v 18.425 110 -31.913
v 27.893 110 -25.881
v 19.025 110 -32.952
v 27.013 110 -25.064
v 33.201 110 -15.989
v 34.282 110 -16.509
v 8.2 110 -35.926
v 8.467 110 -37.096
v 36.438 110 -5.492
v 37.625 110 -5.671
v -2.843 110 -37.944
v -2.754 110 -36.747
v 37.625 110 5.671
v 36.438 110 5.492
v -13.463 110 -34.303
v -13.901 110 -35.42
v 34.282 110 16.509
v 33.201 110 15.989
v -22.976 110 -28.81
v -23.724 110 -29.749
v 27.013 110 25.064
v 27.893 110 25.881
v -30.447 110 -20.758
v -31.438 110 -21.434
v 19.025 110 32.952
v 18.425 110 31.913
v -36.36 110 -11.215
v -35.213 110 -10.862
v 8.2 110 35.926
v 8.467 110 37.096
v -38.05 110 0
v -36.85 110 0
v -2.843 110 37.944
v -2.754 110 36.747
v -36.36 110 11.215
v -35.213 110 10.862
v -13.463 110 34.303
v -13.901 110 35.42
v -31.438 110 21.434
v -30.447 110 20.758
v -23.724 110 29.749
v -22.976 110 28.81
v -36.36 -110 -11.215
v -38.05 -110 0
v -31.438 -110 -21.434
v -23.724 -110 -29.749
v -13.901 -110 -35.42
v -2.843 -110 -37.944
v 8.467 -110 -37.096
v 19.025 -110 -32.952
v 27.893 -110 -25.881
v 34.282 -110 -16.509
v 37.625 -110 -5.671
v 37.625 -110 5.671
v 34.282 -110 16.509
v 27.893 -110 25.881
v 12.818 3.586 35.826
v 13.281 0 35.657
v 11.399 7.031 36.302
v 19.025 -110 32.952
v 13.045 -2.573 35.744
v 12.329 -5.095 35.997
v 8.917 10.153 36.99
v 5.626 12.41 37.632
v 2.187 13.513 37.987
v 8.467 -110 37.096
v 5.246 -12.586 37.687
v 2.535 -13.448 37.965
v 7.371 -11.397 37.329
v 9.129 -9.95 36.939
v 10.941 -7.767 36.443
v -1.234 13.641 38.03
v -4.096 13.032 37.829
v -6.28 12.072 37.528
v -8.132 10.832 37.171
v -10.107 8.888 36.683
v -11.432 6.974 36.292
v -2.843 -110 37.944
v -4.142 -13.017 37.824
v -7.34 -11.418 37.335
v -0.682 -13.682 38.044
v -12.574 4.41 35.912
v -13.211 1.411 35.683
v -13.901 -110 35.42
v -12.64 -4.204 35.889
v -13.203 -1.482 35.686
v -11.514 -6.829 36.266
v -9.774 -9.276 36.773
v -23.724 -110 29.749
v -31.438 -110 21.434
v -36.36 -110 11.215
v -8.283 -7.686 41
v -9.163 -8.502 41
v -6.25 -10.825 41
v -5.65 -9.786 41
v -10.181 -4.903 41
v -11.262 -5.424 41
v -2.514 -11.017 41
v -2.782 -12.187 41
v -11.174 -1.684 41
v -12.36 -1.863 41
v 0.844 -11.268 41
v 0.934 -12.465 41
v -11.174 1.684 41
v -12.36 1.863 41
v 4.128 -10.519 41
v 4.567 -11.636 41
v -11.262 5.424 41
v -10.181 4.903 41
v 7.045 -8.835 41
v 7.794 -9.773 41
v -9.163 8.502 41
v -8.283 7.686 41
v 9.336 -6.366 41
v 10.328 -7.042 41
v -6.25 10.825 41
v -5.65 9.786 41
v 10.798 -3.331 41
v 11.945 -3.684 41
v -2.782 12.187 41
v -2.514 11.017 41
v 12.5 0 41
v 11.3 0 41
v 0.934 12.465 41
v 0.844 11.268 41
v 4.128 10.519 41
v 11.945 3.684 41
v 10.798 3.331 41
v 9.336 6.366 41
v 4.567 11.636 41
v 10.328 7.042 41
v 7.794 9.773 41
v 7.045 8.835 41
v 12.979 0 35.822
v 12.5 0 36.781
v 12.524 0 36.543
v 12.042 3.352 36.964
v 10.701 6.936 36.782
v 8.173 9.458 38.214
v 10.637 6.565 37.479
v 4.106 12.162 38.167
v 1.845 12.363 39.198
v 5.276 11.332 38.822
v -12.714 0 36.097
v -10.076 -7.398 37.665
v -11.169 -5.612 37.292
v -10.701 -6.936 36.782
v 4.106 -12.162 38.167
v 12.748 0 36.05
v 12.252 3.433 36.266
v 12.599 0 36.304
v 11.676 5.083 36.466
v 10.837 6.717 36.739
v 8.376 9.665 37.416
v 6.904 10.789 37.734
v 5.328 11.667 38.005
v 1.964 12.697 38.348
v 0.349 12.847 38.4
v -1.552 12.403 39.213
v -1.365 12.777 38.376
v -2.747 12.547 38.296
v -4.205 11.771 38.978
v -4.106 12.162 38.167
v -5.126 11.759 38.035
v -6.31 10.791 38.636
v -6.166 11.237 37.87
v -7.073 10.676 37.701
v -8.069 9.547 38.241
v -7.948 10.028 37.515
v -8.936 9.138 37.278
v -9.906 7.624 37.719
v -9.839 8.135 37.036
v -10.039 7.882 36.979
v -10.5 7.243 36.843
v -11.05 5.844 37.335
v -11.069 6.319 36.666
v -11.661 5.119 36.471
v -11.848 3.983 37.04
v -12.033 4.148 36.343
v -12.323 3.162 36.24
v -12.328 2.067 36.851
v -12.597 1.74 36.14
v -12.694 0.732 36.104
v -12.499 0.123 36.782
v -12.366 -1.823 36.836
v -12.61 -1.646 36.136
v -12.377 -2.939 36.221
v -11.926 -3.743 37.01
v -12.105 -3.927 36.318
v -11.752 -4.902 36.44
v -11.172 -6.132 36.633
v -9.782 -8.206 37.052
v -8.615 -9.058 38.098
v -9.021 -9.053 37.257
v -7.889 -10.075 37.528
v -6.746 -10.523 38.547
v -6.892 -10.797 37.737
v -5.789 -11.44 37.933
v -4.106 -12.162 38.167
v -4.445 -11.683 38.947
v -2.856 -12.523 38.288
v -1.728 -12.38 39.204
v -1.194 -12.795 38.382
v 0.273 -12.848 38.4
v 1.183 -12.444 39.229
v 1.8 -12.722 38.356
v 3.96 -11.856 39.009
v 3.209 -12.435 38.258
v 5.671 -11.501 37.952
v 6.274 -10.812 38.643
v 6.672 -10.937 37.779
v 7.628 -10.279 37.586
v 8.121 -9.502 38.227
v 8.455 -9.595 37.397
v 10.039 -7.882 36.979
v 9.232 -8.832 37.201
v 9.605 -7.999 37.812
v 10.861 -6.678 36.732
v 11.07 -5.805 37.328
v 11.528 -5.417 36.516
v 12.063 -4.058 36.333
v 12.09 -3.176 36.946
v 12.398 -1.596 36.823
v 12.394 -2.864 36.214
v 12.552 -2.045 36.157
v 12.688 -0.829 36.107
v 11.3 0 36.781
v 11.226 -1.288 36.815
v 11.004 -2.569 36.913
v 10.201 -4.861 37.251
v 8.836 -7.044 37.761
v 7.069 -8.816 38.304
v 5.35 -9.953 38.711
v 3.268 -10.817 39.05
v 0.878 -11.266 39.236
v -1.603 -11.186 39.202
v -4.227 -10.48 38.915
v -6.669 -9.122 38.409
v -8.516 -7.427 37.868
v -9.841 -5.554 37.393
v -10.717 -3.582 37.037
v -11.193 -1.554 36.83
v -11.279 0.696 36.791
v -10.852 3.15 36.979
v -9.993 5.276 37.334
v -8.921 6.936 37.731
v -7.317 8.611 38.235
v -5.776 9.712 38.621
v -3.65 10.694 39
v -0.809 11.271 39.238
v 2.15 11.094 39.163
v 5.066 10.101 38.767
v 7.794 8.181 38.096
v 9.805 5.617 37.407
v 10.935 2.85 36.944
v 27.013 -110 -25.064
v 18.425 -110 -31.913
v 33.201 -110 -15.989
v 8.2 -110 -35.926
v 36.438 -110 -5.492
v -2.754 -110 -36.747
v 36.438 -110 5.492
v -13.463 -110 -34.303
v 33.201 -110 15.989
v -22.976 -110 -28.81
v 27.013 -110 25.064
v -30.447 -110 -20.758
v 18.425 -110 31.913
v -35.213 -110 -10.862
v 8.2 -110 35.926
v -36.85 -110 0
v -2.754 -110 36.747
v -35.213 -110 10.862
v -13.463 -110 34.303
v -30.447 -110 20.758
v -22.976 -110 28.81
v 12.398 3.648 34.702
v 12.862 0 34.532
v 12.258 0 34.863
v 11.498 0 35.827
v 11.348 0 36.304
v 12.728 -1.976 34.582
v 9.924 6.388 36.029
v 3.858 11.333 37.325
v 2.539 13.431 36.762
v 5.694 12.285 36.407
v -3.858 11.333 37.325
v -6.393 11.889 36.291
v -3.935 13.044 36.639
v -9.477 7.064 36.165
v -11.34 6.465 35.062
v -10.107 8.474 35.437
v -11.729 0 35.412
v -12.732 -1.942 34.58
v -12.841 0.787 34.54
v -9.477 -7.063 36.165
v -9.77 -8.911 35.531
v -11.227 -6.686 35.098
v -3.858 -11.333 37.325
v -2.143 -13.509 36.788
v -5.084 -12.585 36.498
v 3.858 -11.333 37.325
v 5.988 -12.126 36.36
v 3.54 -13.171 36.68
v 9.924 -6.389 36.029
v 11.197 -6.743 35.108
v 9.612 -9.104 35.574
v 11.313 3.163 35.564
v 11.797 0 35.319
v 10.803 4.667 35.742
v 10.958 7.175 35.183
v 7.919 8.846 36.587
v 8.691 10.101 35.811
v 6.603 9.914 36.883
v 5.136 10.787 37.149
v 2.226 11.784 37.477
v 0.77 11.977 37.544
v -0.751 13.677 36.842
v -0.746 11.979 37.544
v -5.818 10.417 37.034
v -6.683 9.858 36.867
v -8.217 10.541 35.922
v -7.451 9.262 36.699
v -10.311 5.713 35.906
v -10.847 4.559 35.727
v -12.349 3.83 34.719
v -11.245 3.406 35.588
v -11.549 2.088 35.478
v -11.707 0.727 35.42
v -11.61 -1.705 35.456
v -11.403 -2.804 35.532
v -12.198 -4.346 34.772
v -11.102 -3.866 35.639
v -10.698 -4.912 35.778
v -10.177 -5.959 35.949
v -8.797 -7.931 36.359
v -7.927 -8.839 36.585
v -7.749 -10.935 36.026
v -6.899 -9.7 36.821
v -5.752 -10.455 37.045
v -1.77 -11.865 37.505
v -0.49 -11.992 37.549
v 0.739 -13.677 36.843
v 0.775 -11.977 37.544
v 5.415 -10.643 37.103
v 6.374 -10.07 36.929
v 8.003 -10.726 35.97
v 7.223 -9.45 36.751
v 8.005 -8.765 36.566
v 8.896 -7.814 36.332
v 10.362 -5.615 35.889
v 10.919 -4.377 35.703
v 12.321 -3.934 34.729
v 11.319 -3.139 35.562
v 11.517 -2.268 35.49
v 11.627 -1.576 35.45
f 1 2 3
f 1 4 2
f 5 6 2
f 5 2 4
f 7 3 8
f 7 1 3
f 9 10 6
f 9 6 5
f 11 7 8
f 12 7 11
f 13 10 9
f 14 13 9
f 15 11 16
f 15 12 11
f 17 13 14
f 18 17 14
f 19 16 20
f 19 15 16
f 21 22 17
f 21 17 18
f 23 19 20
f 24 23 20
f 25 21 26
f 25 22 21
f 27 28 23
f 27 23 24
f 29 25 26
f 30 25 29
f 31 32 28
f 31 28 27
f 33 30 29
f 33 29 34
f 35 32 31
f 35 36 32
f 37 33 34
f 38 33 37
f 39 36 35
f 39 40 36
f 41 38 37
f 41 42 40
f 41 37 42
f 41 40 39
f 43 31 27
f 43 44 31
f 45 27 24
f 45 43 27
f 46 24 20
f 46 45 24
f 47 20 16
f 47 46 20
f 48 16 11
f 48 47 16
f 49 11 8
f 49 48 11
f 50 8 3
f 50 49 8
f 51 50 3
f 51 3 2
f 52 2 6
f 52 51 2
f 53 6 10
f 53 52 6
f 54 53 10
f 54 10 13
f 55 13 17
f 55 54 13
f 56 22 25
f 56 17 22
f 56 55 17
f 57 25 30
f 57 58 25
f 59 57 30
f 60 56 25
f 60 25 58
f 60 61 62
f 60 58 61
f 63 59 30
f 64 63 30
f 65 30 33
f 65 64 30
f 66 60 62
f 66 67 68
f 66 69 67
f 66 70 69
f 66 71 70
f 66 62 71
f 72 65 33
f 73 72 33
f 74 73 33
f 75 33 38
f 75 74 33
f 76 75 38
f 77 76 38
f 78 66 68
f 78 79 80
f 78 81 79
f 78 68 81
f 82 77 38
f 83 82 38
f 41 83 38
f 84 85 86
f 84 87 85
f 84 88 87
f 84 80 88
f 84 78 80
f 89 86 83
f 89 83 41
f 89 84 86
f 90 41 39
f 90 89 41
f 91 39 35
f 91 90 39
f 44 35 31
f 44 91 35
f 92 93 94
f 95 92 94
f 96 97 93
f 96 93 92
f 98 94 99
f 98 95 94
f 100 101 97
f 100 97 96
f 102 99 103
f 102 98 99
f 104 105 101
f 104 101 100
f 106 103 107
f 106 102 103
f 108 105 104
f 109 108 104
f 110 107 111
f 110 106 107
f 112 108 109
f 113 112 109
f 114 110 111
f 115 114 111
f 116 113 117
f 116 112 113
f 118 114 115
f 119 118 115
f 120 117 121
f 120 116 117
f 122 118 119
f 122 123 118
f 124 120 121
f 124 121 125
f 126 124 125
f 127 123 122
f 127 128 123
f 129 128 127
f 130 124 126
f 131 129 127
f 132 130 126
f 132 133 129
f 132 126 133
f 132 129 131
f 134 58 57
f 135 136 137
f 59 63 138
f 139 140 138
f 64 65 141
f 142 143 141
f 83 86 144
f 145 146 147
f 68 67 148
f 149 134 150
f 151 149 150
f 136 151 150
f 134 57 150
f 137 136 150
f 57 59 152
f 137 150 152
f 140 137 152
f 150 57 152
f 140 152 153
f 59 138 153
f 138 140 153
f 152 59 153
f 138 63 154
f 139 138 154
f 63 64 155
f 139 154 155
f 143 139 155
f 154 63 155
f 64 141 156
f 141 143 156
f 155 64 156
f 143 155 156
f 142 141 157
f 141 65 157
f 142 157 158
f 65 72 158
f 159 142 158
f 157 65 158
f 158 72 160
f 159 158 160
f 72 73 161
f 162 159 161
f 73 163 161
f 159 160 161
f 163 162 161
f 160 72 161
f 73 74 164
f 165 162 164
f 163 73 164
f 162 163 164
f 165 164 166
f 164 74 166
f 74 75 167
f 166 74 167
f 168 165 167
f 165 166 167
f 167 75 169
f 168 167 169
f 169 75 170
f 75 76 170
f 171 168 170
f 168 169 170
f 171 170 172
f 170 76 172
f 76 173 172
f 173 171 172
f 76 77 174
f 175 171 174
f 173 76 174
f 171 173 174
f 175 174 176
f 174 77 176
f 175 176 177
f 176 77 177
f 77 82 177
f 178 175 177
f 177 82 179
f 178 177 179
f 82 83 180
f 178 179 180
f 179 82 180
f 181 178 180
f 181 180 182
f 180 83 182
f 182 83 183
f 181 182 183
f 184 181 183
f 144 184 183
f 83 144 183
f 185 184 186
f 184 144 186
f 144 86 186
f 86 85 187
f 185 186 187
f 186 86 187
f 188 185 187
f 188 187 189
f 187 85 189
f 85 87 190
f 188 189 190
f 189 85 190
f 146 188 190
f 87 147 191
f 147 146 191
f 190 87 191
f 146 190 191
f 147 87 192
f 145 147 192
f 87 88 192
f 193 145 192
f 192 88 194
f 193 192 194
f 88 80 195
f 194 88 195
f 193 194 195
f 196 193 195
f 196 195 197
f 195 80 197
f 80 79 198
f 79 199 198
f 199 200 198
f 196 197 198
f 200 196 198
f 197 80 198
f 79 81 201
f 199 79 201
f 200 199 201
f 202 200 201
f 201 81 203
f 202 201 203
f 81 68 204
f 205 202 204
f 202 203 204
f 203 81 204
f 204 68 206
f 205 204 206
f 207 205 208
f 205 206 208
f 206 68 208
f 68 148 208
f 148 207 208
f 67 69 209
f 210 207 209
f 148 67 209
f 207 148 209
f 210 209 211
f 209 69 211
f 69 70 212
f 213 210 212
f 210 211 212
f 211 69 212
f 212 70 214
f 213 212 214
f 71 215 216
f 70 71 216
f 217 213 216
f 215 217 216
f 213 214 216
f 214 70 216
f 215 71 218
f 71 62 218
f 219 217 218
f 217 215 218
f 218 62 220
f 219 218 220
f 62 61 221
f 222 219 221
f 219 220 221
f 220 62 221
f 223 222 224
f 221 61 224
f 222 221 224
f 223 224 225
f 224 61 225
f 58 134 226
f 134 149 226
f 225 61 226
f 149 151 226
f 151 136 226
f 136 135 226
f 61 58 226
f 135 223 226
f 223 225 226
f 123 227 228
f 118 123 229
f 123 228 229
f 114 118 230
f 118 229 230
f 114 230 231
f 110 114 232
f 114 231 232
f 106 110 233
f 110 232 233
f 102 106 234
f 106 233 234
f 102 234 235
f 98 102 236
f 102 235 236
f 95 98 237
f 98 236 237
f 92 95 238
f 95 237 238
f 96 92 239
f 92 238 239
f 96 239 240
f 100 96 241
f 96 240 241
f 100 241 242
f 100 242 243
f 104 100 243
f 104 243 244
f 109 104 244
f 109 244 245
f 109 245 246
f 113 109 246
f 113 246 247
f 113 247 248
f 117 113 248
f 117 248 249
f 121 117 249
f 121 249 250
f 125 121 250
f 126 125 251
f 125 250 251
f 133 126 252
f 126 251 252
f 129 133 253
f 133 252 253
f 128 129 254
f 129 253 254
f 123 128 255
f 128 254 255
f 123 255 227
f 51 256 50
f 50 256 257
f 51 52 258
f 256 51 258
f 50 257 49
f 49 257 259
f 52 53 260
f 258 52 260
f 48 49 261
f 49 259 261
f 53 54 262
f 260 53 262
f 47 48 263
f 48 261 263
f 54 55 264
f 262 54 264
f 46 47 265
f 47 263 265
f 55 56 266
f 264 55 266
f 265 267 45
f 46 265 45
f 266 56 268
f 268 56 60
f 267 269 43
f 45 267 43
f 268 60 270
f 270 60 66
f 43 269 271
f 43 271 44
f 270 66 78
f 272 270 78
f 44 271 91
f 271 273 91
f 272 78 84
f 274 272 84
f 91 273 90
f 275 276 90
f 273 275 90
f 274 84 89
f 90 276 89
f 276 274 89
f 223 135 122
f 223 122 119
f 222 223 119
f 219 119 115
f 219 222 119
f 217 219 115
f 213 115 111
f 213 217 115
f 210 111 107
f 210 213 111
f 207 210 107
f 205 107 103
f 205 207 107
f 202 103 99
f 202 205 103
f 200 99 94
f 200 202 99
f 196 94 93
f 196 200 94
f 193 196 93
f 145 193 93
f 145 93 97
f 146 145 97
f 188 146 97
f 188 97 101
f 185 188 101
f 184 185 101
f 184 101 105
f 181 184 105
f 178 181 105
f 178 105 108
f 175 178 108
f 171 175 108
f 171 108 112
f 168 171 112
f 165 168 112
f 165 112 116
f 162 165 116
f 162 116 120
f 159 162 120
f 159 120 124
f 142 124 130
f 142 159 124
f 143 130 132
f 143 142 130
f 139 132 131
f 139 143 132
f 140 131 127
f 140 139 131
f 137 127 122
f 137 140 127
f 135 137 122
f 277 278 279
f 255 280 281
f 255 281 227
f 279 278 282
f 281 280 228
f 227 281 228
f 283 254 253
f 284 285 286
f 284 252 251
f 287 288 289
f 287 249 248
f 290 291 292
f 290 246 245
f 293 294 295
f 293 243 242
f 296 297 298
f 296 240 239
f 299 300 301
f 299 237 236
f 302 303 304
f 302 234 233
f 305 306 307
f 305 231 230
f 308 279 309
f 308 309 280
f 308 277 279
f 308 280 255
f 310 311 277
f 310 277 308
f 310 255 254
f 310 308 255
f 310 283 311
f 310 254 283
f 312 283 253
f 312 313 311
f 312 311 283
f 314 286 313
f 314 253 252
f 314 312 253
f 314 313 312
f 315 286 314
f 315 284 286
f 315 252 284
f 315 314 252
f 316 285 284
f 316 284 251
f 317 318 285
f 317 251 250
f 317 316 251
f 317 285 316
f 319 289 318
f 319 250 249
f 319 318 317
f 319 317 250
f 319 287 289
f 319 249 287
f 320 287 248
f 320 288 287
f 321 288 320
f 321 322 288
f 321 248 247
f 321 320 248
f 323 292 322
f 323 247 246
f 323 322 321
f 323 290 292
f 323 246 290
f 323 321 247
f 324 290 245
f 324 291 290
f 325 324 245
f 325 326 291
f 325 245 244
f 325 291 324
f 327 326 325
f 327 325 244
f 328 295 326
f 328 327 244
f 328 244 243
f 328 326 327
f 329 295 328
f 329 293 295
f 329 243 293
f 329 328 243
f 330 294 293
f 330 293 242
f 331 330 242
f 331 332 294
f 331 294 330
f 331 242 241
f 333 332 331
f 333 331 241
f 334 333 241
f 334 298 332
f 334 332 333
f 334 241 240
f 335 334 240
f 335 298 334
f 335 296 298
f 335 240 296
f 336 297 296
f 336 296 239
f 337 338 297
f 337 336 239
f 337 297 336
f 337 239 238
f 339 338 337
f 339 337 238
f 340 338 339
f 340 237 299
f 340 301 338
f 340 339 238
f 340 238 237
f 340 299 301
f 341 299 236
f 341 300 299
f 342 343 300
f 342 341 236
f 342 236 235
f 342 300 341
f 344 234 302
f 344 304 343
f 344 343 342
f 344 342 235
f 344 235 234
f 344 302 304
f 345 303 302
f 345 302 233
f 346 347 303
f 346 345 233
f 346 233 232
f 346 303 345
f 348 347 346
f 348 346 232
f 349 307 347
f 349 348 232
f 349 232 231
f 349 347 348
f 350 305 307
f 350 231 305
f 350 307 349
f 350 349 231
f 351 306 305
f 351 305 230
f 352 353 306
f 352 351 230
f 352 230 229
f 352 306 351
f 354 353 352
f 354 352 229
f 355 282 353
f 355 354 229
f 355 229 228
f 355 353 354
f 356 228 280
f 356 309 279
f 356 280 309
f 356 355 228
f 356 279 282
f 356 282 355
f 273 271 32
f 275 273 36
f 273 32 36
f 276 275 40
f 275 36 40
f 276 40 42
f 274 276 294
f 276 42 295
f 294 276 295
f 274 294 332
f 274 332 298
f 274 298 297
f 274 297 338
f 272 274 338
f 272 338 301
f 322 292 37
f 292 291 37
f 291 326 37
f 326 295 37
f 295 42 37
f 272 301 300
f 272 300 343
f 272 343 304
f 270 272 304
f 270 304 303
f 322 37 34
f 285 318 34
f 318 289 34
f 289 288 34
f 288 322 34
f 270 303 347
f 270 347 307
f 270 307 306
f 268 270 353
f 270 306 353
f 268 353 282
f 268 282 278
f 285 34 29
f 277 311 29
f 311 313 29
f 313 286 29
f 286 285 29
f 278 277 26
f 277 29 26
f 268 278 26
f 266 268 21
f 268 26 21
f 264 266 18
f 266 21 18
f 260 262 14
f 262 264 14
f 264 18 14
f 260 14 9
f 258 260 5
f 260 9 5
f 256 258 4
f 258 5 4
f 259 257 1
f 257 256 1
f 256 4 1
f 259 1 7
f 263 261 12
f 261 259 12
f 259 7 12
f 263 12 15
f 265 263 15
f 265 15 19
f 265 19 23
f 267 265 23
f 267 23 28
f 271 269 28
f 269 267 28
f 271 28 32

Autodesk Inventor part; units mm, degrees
ref_plane "YZ Plane" through (0, 0, 0) normal (1, 0, 0) x (0, 1, 0)
ref_plane "XZ Plane" through (0, 0, 0) normal (0, 1, 0) x (-1, 0, 0)
ref_plane "XY Plane" through (0, 0, 0) normal (0, 0, 1) x (1, 0, 0)
sketch "Szkic8" plane through (0, 0, 0) normal (0, 1, 0) x (-1, 0, 0)
  circle A0 centre (0, 0) radius 38.05
  circle A1 centre (0, 0) radius 36.85
  dimension "d53" = 76.1
  dimension "d54" = 1.2
extrude "Wyciągnięcie proste2" add sketch "Szkic8" along normal mid plane 220
sketch "Szkic13" plane through (0, 0, 0) normal (0, 0, 1) x (1, 0, 0)
  circle A0 centre (0, 0) radius 12.5
  circle A1 centre (0, 0) radius 11.3
  dimension "d67" = 25
  dimension "d68" = 1.2
extrude "Wyciągnięcie proste6" add sketch "Szkic13" along normal blind 41
sketch "Szkic14" plane through (0, 0, 41) normal (0, 0, 1) x (1, 0, 0)
  circle A0 centre (0, 0) radius 11.3 projected
extrude "Wyciągnięcie proste7" cut sketch "Szkic14" against normal blind 41
sketch "Szkic15" plane through (0, -110, 0) normal (0, -1, 0) x (1, 0, 0)
  circle A0 centre (0, 0) radius 36.85 projected
extrude "Wyciągnięcie proste8" cut sketch "Szkic15" against normal blind 220
fillet "Zaokrąglenie3" radius 1.2 2 edges at (0, 12.5, 38.05) (0, -12.5, 38.05)
fillet "Zaokrąglenie4" radius 2.4 2 edges at (0.0022, -11.3, 36.85) (0, 11.3, 36.85)
equation "\"d53\" = OD"
equation "\"d54\" = THK"
equation "\"d55\" = L1"
equation "\"d67\" = OD2"
equation "\"d68\" = THK"
equation "\"d69\" = L2"
equation "\"d71\" = L2"
equation "\"d73\" = L1"
equation "\"d75\" = THK"
equation "\"d76\" = 2 * THK"
equation "\"SzerokośćGięciaPodcięcia\" = Grubość"
equation "\"RozmiarPodcięciaNarożnika\" = 4 * Grubość"
equation "\"PromieńPrzejścia\" = PromieńGięcia"
equation "\"Rozmiar_promienia_Jacobiego\" = PromieńGięcia"
equation "\"Wielk_odstępu\" = Grubość"
equation "\"d2\" = PromieńGięcia"
equation "\"d23\" = PromieńGięcia"
equation "\"OD\" = 76.1"
equation "\"THK\" = 1.2"
equation "\"L1\" = 220"
equation "\"L2\" = 41"
equation "\"OD2\" = 25"
equation "\"Grubość\" = 1.5"
equation "\"PromieńGięcia\" = 3"
properties part number "Trójnik red. krótki  Ø76,1 25 76,1 s=1,2 L=220" material "304"
